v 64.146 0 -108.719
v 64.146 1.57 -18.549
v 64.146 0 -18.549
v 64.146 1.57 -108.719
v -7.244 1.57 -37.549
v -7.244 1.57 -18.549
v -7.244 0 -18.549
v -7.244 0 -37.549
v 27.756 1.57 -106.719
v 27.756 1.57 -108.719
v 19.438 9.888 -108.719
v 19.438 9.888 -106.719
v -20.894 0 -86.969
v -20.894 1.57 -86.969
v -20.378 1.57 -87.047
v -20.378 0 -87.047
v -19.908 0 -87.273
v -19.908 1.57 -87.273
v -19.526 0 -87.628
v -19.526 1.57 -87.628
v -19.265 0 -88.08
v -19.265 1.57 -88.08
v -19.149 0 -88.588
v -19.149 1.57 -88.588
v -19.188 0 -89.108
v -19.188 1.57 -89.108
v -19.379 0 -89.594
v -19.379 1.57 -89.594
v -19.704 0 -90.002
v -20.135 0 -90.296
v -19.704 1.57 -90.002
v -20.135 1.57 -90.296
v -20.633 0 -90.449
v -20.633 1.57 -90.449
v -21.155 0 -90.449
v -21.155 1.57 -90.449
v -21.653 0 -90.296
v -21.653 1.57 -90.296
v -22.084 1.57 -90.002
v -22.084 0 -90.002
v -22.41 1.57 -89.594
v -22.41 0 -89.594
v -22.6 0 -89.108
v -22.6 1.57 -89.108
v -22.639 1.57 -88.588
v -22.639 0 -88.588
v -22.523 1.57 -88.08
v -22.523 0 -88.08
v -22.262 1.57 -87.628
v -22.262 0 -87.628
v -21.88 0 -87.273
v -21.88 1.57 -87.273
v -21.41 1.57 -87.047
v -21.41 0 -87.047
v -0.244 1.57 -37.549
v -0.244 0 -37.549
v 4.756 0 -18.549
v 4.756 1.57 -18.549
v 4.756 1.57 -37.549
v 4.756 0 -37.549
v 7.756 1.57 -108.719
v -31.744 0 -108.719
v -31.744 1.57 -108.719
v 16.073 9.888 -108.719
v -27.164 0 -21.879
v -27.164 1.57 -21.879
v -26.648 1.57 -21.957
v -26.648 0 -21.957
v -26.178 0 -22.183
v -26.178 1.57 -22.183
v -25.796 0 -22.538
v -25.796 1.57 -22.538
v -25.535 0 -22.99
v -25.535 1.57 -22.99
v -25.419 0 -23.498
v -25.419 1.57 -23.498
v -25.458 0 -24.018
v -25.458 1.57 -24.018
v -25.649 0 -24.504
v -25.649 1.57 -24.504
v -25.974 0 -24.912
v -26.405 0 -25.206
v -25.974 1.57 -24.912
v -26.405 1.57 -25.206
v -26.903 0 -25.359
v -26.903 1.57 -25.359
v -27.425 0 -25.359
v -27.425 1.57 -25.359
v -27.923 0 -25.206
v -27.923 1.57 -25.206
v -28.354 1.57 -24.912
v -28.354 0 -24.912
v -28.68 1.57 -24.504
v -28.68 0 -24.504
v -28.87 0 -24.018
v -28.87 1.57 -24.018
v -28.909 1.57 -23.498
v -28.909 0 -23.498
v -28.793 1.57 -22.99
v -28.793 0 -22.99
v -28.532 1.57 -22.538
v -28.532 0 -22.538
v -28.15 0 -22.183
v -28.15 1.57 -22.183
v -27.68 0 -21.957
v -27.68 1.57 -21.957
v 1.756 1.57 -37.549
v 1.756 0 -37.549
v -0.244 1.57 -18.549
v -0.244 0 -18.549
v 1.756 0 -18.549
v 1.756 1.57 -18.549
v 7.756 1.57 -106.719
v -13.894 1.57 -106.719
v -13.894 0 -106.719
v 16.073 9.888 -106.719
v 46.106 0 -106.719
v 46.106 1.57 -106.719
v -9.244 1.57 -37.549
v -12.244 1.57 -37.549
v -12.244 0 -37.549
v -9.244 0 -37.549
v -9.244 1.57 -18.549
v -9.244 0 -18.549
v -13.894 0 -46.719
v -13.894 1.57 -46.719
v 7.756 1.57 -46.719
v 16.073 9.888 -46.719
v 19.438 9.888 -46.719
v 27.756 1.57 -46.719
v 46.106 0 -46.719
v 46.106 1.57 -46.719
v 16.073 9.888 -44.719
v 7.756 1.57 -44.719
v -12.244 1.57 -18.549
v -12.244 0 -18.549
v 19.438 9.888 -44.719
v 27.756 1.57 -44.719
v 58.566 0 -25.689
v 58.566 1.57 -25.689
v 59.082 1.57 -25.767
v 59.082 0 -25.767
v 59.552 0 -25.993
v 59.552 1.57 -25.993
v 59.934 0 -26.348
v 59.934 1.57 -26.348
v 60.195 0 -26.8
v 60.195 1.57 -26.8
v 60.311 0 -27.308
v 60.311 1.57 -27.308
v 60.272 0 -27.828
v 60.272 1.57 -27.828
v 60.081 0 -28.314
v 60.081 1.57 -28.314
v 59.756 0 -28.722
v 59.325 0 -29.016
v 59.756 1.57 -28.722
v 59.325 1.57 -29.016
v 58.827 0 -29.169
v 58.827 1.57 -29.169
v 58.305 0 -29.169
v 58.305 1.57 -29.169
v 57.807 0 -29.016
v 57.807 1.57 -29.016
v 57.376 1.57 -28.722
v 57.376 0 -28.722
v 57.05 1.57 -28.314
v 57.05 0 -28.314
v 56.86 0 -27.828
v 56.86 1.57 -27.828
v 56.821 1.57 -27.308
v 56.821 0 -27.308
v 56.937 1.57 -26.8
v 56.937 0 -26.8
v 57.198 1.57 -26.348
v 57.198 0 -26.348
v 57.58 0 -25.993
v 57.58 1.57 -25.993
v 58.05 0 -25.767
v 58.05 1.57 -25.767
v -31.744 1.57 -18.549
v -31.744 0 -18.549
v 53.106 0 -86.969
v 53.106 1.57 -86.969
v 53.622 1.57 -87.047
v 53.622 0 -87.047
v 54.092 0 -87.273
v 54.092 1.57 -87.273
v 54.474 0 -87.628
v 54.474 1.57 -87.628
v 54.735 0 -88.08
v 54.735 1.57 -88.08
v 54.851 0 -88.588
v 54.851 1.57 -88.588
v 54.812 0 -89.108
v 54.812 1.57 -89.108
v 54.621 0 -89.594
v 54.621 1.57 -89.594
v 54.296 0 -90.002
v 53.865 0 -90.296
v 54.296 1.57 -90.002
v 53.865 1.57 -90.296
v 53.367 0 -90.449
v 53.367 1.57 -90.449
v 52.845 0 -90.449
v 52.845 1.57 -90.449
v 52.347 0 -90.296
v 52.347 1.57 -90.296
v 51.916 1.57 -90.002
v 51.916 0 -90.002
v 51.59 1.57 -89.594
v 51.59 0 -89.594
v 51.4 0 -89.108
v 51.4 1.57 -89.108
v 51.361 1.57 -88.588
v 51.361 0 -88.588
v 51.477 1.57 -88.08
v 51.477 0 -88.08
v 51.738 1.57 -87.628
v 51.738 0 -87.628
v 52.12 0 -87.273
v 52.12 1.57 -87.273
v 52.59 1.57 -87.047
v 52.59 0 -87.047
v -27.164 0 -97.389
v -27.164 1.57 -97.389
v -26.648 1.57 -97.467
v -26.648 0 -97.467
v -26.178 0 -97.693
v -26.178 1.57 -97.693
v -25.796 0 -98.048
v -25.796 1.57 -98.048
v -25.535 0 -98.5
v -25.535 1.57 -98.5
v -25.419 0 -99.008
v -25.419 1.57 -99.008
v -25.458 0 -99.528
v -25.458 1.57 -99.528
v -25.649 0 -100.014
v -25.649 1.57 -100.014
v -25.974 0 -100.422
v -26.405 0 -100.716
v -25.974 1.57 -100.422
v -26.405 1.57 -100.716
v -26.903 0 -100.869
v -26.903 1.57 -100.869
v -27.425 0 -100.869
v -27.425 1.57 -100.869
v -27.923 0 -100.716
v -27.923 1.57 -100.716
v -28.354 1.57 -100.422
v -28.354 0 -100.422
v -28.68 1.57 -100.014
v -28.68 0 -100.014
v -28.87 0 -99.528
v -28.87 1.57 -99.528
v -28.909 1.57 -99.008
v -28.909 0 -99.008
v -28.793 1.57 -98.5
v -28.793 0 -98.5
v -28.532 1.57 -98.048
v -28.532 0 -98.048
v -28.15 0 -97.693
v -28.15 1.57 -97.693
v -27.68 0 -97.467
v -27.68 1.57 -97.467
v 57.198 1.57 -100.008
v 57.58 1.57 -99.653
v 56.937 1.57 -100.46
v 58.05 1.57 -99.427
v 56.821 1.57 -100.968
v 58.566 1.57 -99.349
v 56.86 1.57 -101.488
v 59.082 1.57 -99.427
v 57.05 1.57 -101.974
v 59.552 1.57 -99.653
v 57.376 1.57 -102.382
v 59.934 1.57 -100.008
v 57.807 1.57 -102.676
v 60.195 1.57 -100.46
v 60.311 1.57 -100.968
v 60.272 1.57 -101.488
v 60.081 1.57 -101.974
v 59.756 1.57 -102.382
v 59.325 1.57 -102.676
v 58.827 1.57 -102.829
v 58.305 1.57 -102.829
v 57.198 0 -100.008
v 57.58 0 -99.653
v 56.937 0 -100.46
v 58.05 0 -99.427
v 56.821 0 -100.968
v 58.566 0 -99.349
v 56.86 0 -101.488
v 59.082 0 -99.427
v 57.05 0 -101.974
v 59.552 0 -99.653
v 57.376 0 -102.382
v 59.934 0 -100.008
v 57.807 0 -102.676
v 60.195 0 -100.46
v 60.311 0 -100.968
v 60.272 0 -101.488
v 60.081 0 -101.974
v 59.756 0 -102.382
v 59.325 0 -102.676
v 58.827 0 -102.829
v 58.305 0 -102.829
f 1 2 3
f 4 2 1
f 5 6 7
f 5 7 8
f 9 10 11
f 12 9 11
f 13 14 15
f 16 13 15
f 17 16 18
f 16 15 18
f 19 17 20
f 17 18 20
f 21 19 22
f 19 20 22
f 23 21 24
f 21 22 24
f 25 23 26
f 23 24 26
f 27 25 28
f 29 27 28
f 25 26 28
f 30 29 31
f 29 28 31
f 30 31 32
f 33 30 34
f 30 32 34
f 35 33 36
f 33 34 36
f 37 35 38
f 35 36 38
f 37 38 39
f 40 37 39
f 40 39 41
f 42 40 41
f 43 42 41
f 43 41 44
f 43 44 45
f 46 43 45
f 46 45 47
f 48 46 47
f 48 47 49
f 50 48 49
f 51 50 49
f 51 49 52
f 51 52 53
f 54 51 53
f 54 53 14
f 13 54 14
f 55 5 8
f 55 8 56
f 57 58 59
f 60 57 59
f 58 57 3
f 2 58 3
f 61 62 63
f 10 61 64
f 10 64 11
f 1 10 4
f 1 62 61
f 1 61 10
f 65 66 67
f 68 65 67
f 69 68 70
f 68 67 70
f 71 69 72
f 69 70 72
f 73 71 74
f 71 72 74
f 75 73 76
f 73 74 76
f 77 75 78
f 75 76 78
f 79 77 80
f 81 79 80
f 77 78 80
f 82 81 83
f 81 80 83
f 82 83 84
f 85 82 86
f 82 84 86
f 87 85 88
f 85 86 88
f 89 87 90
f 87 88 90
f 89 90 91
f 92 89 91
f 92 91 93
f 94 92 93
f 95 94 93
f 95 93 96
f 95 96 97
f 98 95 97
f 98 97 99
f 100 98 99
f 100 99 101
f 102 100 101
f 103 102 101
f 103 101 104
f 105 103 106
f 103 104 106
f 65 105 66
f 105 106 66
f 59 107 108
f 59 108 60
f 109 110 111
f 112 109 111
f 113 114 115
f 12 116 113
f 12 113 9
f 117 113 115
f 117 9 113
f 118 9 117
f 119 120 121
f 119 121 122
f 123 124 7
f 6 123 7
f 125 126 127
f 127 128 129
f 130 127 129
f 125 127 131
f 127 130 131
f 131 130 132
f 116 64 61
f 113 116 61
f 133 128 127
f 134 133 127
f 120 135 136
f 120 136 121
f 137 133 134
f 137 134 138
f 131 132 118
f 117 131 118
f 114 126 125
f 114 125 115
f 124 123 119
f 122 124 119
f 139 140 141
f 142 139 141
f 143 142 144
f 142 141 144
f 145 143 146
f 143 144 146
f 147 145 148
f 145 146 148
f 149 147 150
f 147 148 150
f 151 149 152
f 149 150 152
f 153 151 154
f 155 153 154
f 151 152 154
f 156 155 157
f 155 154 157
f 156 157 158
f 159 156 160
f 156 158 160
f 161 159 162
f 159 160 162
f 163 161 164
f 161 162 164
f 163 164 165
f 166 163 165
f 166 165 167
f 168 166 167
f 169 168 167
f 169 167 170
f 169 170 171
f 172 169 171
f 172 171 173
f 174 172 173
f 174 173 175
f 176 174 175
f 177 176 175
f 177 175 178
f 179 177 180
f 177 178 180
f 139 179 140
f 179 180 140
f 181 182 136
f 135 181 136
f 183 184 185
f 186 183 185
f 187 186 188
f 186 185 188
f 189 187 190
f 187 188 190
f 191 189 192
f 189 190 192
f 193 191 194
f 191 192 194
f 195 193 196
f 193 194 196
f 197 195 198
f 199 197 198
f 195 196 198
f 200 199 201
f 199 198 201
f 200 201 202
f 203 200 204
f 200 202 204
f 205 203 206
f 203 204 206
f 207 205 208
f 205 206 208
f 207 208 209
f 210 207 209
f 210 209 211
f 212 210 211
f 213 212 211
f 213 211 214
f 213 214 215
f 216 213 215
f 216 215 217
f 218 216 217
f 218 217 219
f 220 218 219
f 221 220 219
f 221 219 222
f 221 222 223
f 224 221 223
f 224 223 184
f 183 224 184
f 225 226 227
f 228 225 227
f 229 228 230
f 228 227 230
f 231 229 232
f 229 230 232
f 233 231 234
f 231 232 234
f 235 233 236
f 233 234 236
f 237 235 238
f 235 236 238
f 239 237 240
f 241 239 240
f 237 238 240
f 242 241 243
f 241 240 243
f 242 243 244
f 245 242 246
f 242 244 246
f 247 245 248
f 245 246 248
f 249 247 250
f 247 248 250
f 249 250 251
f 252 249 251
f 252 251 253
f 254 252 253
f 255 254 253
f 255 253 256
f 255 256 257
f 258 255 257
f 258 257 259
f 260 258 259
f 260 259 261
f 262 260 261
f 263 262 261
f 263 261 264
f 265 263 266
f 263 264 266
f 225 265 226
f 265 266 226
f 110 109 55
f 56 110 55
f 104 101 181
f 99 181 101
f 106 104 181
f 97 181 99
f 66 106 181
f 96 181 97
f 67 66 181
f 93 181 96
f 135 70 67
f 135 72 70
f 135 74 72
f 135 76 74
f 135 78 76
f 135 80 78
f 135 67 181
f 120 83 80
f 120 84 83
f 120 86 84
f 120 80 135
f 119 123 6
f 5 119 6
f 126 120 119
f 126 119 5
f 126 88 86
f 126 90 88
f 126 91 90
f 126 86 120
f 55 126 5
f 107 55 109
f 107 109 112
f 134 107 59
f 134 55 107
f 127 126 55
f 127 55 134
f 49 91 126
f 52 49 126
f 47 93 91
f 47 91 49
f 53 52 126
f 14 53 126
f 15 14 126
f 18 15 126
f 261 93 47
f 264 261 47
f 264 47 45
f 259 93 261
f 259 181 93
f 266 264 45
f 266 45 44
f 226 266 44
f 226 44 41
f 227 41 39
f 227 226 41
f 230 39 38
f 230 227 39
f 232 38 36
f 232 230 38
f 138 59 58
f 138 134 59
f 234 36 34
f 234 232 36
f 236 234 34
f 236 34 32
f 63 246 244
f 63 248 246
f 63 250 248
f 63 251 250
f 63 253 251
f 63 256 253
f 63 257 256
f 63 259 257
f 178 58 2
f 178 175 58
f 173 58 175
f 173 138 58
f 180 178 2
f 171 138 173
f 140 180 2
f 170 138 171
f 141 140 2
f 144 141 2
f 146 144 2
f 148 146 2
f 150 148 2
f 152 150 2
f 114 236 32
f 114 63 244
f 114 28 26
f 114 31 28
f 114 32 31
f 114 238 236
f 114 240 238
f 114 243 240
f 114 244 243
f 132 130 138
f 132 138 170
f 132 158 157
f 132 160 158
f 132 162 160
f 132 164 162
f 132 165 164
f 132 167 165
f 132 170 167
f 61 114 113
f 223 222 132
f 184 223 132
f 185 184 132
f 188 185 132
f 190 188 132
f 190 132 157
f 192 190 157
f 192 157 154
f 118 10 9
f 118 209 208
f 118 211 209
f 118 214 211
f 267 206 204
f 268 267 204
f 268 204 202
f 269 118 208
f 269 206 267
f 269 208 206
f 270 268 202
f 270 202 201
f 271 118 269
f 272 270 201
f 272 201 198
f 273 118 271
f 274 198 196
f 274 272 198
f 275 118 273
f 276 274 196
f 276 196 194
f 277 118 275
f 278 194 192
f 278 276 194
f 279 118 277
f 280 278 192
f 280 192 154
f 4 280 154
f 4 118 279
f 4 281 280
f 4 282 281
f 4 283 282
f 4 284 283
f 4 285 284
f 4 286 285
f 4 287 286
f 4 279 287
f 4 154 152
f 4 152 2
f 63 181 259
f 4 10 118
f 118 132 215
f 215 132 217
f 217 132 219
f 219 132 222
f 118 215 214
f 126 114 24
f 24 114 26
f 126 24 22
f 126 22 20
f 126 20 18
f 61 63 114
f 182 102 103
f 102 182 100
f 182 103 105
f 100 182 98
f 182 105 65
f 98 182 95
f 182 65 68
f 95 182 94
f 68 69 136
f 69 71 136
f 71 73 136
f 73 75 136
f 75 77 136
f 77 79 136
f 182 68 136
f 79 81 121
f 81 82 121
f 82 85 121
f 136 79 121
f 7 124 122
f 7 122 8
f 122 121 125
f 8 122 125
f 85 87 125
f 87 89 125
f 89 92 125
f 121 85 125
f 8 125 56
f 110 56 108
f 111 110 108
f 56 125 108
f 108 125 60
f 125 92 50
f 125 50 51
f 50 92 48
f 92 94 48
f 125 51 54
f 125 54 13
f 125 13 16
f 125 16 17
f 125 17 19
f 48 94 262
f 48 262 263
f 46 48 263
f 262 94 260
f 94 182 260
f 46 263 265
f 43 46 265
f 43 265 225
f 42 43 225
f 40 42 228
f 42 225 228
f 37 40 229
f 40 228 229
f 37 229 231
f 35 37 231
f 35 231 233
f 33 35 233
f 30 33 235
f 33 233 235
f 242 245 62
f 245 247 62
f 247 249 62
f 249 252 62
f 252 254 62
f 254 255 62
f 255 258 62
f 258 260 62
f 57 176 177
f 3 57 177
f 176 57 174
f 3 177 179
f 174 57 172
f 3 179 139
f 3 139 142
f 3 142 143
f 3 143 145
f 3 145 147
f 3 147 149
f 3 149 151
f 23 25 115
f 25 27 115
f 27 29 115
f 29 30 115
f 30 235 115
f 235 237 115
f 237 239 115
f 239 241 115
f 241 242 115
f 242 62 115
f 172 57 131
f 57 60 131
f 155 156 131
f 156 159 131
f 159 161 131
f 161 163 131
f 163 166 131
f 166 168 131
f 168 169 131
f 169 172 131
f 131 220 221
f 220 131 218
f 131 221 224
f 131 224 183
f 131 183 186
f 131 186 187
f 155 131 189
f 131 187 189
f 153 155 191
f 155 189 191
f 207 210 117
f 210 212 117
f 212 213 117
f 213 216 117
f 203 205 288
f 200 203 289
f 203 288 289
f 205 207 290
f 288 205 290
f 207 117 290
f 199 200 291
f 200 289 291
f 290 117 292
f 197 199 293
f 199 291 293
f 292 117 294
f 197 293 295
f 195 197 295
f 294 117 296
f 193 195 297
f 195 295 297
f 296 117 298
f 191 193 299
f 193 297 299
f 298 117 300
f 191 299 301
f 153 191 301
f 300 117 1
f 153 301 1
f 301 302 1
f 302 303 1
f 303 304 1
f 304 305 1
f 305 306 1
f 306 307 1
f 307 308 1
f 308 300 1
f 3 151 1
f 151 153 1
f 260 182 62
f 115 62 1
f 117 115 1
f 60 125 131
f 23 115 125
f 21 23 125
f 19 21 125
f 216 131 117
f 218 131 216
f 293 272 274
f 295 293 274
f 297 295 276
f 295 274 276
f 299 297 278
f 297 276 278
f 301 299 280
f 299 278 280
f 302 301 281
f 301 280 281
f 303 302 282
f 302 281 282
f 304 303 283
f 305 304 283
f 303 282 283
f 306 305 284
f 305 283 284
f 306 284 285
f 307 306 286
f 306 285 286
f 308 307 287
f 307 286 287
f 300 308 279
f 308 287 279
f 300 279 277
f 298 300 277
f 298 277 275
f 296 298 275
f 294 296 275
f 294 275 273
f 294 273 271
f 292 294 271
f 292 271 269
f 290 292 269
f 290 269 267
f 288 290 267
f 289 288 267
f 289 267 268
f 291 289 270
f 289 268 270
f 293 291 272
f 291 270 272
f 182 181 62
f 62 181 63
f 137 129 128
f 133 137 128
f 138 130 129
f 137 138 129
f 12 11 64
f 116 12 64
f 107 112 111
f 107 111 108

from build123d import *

# Parameters (mm, degrees)
SKETCH1_W               = 96.89
SKETCH1_H               = 90.17
PCB_DEPTH               = 1.57
SKETCH2_R               = 1.75
M3_MOUNTING_HOLES_DEPTH = 1.57
SKETCH4_R               = 1.75
CUT_EXTRUDE1_DEPTH      = 23
BOSS_EXTRUDE2_DEPTH     = 2
BOSS_EXTRUDE3_DEPTH     = 2
SKETCH9_W               = 3
SKETCH9_H               = 19
SKETCH9_W_2             = 7
CUT_EXTRUDE2_DEPTH      = 127.760011393
SKETCH10_W              = 0.5
SKETCH10_H              = 90.17
CUT_EXTRUDE3_DEPTH      = 10
SKETCH11_W              = 60
SKETCH11_H              = 60
CUT_EXTRUDE4_DEPTH      = 10


with BuildPart() as part:
    # Sketch1 → PCB (new body)
    with BuildSketch(Plane(origin=(0, 0, 0), x_dir=(1, 0, 0), z_dir=(0, 1, 0))):
        with Locations((16.200949951, 63.633996534)):
            Rectangle(SKETCH1_W, SKETCH1_H)
    extrude(amount=PCB_DEPTH)

    # Sketch2 → M3 Mounting Holes (cut)
    with BuildSketch(Plane(origin=(0, 1.57, 0), x_dir=(1, 0, 0), z_dir=(0, 1, 0))):
        with Locations(Location((58.565949951, 27.438996534, 0), (0, 0, 270))):
            Circle(SKETCH2_R)
        with Locations(Location((-27.164050049, 23.628996534, 0), (0, 0, 270))):
            Circle(SKETCH2_R)
        with Locations(Location((-27.164050049, 99.138996534, 0), (0, 0, 270))):
            Circle(SKETCH2_R)
        with Locations(Location((58.565949951, 101.098996534, 0), (0, 0, 270))):
            Circle(SKETCH2_R)
    extrude(amount=-M3_MOUNTING_HOLES_DEPTH, mode=Mode.SUBTRACT)

    # Sketch4 → Cut-Extrude1 (cut)
    with BuildSketch(Plane(origin=(0, 1.57, 0), x_dir=(1, 0, 0), z_dir=(0, 1, 0))):
        with Locations(Location((-20.894050049, 88.718996534, 0), (0, 0, 270))):
            Circle(SKETCH4_R)
        with Locations(Location((53.105949951, 88.718996534, 0), (0, 0, 270))):
            Circle(SKETCH4_R)
    extrude(amount=-CUT_EXTRUDE1_DEPTH, mode=Mode.SUBTRACT)

    # Sketch7 → Boss-Extrude2 (add)
    with BuildSketch(Plane.XY.offset(-46.718996534)):
        Polygon((27.755949951, 1.57), (19.438412086, 9.887537865), (16.073487816, 9.887537865), (7.755949951, 1.57), align=None)
    extrude(amount=BOSS_EXTRUDE2_DEPTH)

    # Sketch8 → Boss-Extrude3 (add)
    with BuildSketch(Plane.XY.offset(-108.718996534)):
        Polygon((27.755949951, 1.57), (19.438412086, 9.887537865), (16.073487816, 9.887537865), (7.755949951, 1.57), align=None)
    extrude(amount=BOSS_EXTRUDE3_DEPTH)

    # Sketch9 → Cut-Extrude2 (cut, through all)
    with BuildSketch(Plane(origin=(0, 1.57, 0), x_dir=(1, 0, 0), z_dir=(0, 1, 0))):
        with Locations((-10.744050049, 28.048996534)):
            Rectangle(SKETCH9_W, SKETCH9_H)
        with Locations((-3.744050049, 28.048996534)):
            Rectangle(SKETCH9_W_2, SKETCH9_H)
        with Locations((3.255949951, 28.048996534)):
            Rectangle(SKETCH9_W, SKETCH9_H)
    extrude(amount=-CUT_EXTRUDE2_DEPTH, mode=Mode.SUBTRACT)

    # Sketch10 → Cut-Extrude3 (cut)
    with BuildSketch(Plane(origin=(0, 1.57, 0), x_dir=(1, 0, 0), z_dir=(0, 1, 0))):
        with Locations((-31.994050049, 63.633996534)):
            Rectangle(SKETCH10_W, SKETCH10_H)
        with Locations((64.395949951, 63.633996534)):
            Rectangle(SKETCH10_W, SKETCH10_H)
    extrude(amount=-CUT_EXTRUDE3_DEPTH, mode=Mode.SUBTRACT)

    # Sketch11 → Cut-Extrude4 (cut)
    with BuildSketch(Plane(origin=(0, 1.57, 0), x_dir=(1, 0, 0), z_dir=(0, 1, 0))):
        with Locations((16.105949951, 76.718996534)):
            Rectangle(SKETCH11_W, SKETCH11_H)
    extrude(amount=-CUT_EXTRUDE4_DEPTH, mode=Mode.SUBTRACT)


solid = part.part
